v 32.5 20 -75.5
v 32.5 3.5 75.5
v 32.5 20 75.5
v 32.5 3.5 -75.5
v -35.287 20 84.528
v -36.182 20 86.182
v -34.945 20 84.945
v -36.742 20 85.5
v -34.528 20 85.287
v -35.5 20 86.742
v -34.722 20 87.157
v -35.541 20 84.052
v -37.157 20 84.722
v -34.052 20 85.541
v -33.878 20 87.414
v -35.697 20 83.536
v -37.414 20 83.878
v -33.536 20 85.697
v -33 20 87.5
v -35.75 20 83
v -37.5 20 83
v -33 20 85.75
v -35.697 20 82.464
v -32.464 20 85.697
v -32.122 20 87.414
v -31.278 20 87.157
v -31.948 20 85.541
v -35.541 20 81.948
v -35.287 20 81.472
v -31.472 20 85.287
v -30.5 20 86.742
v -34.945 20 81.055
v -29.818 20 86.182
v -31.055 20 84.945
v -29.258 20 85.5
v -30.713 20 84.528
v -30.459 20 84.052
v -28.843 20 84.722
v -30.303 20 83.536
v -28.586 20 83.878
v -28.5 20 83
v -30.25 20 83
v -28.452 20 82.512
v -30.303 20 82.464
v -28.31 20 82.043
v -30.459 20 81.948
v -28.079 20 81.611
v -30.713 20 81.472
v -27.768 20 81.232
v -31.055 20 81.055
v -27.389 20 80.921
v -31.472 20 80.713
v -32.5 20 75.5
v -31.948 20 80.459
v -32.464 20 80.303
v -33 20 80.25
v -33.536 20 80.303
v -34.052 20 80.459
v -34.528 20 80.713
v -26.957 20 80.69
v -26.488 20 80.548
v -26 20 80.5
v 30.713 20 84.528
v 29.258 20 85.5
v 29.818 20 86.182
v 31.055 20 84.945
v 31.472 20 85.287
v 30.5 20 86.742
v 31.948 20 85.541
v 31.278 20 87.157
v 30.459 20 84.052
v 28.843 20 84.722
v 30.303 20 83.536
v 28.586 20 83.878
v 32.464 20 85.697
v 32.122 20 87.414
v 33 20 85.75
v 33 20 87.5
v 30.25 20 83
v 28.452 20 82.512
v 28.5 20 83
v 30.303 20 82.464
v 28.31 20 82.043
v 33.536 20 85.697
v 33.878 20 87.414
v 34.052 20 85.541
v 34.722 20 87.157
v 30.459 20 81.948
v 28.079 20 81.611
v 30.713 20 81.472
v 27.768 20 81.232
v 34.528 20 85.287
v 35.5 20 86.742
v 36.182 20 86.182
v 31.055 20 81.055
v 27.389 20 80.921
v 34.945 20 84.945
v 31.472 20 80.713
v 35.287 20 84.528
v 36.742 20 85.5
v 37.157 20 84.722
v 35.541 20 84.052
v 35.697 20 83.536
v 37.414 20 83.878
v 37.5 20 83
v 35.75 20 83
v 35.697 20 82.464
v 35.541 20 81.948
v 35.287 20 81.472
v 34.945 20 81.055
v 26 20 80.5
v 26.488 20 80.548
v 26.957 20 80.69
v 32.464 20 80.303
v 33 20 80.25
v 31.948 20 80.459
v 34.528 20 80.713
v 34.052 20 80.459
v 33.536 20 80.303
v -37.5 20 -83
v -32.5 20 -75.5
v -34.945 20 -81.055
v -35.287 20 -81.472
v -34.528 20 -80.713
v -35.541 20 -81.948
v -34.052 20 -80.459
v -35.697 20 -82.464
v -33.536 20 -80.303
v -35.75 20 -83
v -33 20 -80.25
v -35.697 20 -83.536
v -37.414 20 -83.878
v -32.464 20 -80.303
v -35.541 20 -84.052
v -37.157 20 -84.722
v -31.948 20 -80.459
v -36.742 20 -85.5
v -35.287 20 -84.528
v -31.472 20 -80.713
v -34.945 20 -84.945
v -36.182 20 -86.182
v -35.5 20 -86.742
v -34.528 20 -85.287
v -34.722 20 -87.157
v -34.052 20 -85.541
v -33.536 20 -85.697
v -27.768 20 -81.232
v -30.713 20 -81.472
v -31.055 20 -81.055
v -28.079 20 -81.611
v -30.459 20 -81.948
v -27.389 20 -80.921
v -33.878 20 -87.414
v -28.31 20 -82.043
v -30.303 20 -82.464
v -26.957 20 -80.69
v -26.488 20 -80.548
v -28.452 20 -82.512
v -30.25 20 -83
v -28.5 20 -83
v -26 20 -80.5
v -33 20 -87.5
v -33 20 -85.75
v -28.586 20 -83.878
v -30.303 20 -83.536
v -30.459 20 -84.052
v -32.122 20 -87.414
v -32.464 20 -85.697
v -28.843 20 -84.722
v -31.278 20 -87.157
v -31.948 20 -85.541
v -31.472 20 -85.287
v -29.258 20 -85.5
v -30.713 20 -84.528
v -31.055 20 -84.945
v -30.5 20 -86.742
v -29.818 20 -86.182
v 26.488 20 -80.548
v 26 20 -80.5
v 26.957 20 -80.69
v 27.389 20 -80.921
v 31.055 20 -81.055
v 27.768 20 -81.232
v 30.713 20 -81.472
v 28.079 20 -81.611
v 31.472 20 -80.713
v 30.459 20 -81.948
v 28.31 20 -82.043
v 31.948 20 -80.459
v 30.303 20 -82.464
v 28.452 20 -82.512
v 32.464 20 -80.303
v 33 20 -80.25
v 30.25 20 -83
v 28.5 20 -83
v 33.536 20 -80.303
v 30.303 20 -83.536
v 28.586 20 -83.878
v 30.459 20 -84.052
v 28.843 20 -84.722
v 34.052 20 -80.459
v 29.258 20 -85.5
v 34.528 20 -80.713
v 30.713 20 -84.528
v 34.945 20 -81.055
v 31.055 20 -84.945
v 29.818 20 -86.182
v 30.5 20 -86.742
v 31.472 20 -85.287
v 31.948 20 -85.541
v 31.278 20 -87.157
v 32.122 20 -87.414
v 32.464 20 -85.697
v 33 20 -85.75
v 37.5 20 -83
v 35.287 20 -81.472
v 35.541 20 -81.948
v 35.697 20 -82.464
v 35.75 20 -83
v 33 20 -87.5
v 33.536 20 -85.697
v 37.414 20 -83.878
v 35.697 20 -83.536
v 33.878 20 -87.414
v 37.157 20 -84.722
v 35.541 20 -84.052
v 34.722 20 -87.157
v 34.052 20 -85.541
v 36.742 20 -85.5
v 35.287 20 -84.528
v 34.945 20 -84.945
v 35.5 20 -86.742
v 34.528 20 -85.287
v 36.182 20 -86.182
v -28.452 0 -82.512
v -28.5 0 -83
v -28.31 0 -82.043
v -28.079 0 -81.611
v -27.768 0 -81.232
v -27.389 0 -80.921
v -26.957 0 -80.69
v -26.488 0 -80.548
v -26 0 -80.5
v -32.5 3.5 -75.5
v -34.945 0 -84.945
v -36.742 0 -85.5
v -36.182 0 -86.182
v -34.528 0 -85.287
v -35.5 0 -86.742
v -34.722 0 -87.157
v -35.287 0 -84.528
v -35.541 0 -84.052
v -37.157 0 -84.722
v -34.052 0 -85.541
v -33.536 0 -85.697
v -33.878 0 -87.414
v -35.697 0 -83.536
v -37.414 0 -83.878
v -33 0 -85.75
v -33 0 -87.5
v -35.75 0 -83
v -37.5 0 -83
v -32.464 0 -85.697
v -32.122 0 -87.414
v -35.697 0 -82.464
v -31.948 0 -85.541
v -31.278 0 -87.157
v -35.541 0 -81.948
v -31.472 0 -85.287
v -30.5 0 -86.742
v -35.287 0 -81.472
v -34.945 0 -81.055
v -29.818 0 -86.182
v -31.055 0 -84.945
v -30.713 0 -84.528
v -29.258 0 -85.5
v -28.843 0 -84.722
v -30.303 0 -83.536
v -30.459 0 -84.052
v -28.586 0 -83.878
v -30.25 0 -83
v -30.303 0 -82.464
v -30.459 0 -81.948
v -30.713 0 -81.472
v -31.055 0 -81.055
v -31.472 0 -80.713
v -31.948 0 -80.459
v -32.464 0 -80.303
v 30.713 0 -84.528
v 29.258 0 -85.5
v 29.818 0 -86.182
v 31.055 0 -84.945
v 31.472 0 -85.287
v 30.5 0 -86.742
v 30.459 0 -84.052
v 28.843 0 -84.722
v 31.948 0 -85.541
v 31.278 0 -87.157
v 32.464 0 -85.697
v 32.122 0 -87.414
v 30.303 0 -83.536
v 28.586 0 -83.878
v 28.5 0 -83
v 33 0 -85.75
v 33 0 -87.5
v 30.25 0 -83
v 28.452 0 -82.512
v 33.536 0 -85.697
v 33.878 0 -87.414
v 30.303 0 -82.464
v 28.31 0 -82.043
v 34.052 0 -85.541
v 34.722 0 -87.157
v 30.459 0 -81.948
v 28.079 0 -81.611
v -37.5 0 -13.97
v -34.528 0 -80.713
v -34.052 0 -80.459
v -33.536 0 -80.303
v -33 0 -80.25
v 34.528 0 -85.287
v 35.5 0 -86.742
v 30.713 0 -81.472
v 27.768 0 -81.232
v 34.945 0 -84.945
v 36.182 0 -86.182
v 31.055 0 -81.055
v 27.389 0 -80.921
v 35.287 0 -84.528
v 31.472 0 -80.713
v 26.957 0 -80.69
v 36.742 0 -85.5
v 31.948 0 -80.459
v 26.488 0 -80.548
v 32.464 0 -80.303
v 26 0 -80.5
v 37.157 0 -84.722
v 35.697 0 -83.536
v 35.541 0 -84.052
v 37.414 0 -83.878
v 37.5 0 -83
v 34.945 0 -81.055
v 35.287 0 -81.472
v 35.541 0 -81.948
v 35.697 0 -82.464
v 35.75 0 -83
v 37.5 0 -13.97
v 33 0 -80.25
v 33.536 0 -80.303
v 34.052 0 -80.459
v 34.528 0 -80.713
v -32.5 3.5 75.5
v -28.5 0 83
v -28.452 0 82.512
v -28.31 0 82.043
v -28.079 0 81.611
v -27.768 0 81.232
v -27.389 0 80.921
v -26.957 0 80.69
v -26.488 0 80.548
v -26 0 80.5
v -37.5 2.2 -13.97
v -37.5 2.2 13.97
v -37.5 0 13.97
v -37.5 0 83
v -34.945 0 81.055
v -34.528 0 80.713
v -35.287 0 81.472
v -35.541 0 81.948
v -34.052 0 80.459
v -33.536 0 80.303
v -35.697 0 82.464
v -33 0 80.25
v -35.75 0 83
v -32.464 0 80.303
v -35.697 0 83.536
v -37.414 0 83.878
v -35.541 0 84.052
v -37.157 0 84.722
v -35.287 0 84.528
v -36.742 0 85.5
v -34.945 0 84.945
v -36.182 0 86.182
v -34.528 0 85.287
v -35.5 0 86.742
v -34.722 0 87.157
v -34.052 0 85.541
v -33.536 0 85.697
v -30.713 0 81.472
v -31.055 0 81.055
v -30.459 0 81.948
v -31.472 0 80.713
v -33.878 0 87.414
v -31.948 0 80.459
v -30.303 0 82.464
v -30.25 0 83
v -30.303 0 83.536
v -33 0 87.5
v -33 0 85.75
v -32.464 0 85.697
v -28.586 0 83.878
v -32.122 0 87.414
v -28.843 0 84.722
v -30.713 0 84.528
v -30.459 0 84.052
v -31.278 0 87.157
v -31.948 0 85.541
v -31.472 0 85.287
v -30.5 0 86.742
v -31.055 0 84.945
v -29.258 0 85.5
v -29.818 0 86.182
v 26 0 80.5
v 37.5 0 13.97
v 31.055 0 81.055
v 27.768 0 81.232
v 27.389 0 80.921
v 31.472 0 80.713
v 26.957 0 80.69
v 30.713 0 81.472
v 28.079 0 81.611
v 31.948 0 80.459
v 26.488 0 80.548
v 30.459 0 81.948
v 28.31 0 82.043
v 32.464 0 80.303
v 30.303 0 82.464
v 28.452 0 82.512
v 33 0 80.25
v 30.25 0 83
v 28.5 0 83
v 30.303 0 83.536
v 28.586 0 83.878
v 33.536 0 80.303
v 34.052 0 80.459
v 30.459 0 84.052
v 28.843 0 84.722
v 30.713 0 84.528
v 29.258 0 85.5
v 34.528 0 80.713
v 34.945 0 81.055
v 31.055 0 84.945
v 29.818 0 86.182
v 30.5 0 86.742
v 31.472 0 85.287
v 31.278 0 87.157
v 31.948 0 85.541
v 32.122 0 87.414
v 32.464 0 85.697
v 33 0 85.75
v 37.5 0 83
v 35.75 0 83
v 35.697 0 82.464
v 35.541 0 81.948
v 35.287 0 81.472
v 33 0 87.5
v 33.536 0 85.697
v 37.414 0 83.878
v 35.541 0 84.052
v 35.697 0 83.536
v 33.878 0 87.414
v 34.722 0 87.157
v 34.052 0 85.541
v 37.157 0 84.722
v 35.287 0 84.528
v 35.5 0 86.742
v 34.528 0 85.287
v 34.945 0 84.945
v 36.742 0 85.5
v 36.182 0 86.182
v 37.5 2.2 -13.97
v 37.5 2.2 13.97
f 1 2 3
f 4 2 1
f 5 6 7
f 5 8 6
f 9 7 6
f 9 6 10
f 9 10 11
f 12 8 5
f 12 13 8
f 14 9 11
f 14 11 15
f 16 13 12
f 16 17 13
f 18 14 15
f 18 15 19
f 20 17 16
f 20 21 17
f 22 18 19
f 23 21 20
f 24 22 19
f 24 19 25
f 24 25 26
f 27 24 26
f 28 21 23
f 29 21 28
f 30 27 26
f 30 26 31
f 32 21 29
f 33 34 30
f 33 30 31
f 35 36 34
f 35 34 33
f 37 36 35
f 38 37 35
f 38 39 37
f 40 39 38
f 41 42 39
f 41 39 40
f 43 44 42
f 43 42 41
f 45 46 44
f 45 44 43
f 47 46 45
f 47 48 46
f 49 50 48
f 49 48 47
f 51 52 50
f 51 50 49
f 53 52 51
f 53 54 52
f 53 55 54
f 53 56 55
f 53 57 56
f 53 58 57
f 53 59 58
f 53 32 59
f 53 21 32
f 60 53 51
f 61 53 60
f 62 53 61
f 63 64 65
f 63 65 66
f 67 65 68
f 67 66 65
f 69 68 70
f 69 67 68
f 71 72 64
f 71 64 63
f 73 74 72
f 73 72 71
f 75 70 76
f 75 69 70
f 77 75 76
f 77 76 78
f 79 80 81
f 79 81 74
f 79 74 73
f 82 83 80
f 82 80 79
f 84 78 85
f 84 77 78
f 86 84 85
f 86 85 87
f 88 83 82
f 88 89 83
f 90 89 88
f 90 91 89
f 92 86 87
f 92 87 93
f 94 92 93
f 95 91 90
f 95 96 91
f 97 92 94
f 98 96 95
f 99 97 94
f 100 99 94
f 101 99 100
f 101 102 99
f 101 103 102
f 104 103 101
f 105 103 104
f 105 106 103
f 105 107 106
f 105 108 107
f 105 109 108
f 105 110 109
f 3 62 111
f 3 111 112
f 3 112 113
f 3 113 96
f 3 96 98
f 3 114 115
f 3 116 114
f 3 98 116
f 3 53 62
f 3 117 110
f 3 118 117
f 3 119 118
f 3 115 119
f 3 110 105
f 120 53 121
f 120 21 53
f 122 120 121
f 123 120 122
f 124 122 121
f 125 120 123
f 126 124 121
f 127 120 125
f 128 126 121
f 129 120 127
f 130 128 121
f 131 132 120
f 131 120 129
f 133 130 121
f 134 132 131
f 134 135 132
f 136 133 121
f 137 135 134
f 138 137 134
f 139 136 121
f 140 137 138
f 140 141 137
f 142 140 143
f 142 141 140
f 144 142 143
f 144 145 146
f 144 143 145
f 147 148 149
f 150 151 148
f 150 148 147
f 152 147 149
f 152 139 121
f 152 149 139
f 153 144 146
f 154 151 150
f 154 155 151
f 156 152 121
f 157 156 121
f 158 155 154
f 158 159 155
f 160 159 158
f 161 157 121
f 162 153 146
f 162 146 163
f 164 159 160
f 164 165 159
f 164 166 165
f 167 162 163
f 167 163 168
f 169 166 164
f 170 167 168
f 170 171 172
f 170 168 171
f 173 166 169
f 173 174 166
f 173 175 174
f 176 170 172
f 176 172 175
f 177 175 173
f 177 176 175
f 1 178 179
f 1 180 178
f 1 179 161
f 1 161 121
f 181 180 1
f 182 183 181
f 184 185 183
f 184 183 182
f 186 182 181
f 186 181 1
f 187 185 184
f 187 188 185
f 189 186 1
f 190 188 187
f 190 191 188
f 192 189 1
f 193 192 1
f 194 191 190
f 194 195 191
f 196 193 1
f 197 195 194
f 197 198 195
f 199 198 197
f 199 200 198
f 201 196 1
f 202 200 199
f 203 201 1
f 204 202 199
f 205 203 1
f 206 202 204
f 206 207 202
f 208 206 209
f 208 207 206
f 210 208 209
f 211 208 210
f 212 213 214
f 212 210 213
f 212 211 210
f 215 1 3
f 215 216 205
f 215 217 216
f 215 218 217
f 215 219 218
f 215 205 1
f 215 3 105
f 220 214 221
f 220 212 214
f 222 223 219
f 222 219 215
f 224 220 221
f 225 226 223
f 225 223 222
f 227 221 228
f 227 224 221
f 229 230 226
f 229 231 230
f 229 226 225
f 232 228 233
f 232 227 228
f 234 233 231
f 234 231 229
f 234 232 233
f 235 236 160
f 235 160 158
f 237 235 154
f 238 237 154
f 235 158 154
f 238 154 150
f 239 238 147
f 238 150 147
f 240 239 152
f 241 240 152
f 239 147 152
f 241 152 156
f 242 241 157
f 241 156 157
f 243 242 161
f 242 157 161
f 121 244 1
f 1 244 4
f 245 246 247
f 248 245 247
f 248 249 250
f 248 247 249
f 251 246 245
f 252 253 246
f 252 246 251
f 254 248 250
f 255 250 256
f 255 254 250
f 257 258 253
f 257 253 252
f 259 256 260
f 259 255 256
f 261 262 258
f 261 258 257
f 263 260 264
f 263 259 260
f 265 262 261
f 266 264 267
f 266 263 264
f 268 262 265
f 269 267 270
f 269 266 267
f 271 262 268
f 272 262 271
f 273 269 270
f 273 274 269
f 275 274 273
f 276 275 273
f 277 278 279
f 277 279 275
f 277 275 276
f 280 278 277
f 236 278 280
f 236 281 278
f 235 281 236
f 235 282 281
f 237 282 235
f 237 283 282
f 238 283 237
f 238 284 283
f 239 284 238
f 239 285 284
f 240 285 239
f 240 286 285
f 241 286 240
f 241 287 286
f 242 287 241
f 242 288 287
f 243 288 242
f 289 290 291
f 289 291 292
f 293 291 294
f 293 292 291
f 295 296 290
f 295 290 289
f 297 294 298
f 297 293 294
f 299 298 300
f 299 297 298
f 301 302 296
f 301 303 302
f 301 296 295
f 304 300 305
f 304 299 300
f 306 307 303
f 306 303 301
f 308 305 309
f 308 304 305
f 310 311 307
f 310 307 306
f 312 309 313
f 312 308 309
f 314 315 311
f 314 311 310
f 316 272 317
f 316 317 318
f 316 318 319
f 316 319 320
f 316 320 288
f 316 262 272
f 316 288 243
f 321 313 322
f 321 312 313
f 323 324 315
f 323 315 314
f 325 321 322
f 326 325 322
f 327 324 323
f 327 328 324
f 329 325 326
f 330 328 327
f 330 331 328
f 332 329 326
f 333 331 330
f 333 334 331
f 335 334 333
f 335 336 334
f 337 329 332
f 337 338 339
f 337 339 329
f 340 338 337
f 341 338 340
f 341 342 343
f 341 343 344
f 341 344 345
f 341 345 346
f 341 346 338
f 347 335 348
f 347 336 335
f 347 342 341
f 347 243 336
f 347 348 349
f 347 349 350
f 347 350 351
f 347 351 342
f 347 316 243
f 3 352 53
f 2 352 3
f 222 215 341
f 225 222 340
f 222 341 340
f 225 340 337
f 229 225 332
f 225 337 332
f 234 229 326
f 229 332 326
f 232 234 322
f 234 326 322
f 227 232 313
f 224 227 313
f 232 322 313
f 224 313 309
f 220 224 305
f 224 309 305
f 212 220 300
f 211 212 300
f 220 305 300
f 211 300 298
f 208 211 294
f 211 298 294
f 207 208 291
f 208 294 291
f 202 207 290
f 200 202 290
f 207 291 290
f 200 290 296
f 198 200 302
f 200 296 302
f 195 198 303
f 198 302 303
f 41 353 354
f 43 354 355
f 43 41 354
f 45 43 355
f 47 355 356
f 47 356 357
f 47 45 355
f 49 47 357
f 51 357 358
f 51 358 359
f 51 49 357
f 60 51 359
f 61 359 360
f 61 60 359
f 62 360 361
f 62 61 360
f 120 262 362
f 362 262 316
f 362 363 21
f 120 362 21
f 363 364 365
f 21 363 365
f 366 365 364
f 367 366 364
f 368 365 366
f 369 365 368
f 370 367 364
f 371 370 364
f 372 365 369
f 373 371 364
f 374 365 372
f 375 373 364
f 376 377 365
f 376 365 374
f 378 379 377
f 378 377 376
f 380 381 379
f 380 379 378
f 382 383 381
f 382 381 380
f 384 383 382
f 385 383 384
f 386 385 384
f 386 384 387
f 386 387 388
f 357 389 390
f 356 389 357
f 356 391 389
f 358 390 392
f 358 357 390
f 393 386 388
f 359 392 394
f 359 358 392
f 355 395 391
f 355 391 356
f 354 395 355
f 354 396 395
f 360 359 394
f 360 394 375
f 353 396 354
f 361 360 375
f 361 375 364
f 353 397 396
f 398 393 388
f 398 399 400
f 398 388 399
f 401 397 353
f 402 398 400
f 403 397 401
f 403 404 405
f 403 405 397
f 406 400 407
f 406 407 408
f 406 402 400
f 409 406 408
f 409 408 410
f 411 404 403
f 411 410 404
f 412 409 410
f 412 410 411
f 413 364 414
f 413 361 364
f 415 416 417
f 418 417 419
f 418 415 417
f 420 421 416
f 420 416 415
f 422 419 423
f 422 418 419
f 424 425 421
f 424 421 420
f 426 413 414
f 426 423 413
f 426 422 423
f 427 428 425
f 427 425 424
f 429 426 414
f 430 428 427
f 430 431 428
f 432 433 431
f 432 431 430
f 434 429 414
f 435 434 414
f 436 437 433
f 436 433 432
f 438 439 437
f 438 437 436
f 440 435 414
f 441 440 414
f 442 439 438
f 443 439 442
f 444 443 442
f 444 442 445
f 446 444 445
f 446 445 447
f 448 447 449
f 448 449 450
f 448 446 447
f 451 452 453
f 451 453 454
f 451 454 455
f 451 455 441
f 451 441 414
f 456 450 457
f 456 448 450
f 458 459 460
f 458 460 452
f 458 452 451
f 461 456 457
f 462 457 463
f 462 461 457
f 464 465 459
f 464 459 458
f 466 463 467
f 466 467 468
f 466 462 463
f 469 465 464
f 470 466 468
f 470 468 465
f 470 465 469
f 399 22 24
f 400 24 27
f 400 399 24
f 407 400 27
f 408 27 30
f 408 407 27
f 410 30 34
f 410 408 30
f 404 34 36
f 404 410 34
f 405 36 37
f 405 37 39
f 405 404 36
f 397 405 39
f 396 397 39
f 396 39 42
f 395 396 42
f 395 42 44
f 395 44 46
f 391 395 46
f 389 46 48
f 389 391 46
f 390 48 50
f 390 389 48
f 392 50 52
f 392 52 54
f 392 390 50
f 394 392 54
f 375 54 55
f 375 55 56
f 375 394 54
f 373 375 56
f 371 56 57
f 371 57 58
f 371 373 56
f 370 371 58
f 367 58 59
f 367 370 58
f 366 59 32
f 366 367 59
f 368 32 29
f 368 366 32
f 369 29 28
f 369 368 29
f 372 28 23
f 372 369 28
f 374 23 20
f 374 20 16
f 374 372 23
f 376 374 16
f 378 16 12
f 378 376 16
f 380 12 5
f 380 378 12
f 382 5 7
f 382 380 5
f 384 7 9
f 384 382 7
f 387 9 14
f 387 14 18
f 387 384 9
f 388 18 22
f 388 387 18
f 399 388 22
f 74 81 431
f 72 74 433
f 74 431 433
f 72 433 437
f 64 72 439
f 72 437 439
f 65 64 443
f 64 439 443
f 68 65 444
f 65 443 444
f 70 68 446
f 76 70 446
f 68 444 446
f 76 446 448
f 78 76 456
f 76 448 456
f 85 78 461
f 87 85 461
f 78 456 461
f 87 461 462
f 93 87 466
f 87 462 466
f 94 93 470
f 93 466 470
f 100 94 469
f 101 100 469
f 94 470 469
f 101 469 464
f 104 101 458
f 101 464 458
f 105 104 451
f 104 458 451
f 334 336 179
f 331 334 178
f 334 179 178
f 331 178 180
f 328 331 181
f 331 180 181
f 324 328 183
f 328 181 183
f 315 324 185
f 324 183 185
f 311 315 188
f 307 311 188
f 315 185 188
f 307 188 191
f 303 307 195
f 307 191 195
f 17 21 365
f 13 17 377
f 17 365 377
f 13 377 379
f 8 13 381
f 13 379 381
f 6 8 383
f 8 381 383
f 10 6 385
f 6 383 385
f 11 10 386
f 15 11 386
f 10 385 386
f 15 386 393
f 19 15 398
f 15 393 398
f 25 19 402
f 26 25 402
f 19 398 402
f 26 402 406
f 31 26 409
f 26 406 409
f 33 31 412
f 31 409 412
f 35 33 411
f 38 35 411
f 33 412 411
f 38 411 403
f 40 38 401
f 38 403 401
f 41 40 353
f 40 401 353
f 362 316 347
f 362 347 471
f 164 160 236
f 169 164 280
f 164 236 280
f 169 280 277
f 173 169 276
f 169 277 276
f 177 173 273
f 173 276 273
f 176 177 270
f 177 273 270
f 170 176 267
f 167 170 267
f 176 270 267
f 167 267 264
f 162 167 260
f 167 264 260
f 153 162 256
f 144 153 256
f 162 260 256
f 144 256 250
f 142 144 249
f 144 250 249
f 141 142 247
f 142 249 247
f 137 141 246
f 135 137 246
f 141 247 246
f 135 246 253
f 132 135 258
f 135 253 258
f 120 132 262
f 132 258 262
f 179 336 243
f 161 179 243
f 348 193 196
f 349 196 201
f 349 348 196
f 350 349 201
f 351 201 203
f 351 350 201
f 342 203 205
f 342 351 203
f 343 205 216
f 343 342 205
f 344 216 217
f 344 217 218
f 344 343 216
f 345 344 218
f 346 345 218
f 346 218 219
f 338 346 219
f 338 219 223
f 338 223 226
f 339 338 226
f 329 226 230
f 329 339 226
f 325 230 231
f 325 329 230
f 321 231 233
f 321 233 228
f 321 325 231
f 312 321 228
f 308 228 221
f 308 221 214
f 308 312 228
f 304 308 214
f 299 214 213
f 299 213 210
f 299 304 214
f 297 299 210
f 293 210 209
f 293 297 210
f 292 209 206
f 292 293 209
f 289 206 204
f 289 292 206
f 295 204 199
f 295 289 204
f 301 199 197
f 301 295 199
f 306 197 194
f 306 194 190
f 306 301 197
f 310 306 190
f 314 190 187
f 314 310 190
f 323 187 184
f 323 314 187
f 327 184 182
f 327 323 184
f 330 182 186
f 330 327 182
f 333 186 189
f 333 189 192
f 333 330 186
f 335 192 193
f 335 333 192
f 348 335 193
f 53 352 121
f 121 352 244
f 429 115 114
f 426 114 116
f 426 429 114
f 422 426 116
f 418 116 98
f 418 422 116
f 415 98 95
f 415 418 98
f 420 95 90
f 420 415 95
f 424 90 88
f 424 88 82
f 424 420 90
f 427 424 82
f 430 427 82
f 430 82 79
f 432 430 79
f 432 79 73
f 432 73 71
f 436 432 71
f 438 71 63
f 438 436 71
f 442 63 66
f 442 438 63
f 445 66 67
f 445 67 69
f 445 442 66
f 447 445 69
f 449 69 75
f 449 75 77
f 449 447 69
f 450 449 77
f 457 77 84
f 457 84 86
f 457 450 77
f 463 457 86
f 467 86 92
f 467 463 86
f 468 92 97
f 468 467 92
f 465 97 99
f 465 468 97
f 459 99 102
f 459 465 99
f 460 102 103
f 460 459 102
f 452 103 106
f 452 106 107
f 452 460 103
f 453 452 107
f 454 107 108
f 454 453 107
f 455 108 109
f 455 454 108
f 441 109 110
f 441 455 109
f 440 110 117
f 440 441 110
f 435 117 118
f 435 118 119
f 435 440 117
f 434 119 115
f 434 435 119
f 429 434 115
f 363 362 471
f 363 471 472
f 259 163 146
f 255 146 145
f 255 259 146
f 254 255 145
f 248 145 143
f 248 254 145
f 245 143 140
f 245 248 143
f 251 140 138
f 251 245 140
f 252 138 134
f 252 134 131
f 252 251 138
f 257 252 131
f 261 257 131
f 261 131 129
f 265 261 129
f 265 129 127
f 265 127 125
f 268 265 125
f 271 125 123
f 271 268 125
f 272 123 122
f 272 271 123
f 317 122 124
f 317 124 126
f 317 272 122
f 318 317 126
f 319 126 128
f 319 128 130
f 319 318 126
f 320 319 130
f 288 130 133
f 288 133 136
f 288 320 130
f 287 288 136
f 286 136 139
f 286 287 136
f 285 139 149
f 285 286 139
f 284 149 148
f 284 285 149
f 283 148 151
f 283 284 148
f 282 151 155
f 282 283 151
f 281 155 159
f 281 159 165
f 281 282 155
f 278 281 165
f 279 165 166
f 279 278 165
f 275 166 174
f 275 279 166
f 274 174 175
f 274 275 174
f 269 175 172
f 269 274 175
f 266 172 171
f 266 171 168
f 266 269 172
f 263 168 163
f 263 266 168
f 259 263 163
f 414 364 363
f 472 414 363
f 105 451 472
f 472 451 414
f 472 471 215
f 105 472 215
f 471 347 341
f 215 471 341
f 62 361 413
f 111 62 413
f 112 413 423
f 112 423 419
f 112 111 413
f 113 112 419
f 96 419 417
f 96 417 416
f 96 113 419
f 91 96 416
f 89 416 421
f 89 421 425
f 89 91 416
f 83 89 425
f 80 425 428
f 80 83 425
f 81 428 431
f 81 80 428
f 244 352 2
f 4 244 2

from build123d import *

# Parameters (mm, degrees)
SKETCH1_R           = 2.75
SKETCH1_W           = 65
SKETCH1_H           = 151
BOSS_EXTRUDE1_DEPTH = 20
SKETCH3_W           = 65
SKETCH3_H           = 151
BOSS_EXTRUDE2_DEPTH = 3.5
SKETCH4_W           = 27.94
SKETCH4_H           = 2.2
CUT_EXTRUDE1_DEPTH  = 117.966875653
FILLET1_R           = 2.5


with BuildPart() as part:
    # Sketch1 → Boss-Extrude1 (new body)
    with BuildSketch(Plane(origin=(0, 0, 0), x_dir=(1, 0, 0), z_dir=(0, 1, 0))):
        with BuildLine():
            Line((-37.5, 75.5), (-37.5, -75.5))
            Line((-37.5, -75.5), (-37.5, -83))
            ThreePointArc((-37.5, -83), (-33, -87.5), (-28.5, -83))
            Line((-28.5, -83), (-28.5, -80.5))
            Line((-28.5, -80.5), (28.5, -80.5))
            Line((28.5, -80.5), (28.5, -83))
            ThreePointArc((28.5, -83), (33, -87.5), (37.5, -83))
            Line((37.5, -83), (37.5, -75.5))
            Line((37.5, -75.5), (37.5, 75.5))
            Line((37.5, 75.5), (37.5, 83))
            ThreePointArc((37.5, 83), (33, 87.5), (28.5, 83))
            Line((28.5, 83), (28.5, 80.5))
            Line((28.5, 80.5), (-28.5, 80.5))
            Line((-28.5, 80.5), (-28.5, 83))
            ThreePointArc((-28.5, 83), (-33, 87.5), (-37.5, 83))
            Line((-37.5, 83), (-37.5, 75.5))
        make_face()
        with Locations(Location((-33, -83, 0), (0, 0, 270))):
            Circle(SKETCH1_R, mode=Mode.SUBTRACT)
        with Locations(Location((33, -83, 0), (0, 0, 90))):
            Circle(SKETCH1_R, mode=Mode.SUBTRACT)
        with Locations(Location((33, 83, 0), (0, 0, 270))):
            Circle(SKETCH1_R, mode=Mode.SUBTRACT)
        with Locations(Location((-33, 83, 0), (0, 0, 90))):
            Circle(SKETCH1_R, mode=Mode.SUBTRACT)
        Rectangle(SKETCH1_W, SKETCH1_H, mode=Mode.SUBTRACT)
    extrude(amount=BOSS_EXTRUDE1_DEPTH)

    # Sketch3 → Boss-Extrude2 (add)
    with BuildSketch(Plane.XZ):
        Rectangle(SKETCH3_W, SKETCH3_H)
    extrude(amount=-BOSS_EXTRUDE2_DEPTH)

    # Sketch4 → Cut-Extrude1 (cut, through all)
    with BuildSketch(Plane.ZY.offset(37.5)):
        with Locations((0, 1.1)):
            Rectangle(SKETCH4_W, SKETCH4_H)
    extrude(amount=-CUT_EXTRUDE1_DEPTH, mode=Mode.SUBTRACT)

    # Fillet1
    fillet1_edges = [part.edges().sort_by_distance(p)[0] for p in [
        (28.5, 10, 80.5),
        (-28.5, 10, 80.5),
        (28.5, 10, -80.5),
        (-28.5, 10, -80.5),
    ]]
    fillet(fillet1_edges, radius=FILLET1_R - 0.0001)  # a hair under: the kernel refuses the full size


solid = part.part
